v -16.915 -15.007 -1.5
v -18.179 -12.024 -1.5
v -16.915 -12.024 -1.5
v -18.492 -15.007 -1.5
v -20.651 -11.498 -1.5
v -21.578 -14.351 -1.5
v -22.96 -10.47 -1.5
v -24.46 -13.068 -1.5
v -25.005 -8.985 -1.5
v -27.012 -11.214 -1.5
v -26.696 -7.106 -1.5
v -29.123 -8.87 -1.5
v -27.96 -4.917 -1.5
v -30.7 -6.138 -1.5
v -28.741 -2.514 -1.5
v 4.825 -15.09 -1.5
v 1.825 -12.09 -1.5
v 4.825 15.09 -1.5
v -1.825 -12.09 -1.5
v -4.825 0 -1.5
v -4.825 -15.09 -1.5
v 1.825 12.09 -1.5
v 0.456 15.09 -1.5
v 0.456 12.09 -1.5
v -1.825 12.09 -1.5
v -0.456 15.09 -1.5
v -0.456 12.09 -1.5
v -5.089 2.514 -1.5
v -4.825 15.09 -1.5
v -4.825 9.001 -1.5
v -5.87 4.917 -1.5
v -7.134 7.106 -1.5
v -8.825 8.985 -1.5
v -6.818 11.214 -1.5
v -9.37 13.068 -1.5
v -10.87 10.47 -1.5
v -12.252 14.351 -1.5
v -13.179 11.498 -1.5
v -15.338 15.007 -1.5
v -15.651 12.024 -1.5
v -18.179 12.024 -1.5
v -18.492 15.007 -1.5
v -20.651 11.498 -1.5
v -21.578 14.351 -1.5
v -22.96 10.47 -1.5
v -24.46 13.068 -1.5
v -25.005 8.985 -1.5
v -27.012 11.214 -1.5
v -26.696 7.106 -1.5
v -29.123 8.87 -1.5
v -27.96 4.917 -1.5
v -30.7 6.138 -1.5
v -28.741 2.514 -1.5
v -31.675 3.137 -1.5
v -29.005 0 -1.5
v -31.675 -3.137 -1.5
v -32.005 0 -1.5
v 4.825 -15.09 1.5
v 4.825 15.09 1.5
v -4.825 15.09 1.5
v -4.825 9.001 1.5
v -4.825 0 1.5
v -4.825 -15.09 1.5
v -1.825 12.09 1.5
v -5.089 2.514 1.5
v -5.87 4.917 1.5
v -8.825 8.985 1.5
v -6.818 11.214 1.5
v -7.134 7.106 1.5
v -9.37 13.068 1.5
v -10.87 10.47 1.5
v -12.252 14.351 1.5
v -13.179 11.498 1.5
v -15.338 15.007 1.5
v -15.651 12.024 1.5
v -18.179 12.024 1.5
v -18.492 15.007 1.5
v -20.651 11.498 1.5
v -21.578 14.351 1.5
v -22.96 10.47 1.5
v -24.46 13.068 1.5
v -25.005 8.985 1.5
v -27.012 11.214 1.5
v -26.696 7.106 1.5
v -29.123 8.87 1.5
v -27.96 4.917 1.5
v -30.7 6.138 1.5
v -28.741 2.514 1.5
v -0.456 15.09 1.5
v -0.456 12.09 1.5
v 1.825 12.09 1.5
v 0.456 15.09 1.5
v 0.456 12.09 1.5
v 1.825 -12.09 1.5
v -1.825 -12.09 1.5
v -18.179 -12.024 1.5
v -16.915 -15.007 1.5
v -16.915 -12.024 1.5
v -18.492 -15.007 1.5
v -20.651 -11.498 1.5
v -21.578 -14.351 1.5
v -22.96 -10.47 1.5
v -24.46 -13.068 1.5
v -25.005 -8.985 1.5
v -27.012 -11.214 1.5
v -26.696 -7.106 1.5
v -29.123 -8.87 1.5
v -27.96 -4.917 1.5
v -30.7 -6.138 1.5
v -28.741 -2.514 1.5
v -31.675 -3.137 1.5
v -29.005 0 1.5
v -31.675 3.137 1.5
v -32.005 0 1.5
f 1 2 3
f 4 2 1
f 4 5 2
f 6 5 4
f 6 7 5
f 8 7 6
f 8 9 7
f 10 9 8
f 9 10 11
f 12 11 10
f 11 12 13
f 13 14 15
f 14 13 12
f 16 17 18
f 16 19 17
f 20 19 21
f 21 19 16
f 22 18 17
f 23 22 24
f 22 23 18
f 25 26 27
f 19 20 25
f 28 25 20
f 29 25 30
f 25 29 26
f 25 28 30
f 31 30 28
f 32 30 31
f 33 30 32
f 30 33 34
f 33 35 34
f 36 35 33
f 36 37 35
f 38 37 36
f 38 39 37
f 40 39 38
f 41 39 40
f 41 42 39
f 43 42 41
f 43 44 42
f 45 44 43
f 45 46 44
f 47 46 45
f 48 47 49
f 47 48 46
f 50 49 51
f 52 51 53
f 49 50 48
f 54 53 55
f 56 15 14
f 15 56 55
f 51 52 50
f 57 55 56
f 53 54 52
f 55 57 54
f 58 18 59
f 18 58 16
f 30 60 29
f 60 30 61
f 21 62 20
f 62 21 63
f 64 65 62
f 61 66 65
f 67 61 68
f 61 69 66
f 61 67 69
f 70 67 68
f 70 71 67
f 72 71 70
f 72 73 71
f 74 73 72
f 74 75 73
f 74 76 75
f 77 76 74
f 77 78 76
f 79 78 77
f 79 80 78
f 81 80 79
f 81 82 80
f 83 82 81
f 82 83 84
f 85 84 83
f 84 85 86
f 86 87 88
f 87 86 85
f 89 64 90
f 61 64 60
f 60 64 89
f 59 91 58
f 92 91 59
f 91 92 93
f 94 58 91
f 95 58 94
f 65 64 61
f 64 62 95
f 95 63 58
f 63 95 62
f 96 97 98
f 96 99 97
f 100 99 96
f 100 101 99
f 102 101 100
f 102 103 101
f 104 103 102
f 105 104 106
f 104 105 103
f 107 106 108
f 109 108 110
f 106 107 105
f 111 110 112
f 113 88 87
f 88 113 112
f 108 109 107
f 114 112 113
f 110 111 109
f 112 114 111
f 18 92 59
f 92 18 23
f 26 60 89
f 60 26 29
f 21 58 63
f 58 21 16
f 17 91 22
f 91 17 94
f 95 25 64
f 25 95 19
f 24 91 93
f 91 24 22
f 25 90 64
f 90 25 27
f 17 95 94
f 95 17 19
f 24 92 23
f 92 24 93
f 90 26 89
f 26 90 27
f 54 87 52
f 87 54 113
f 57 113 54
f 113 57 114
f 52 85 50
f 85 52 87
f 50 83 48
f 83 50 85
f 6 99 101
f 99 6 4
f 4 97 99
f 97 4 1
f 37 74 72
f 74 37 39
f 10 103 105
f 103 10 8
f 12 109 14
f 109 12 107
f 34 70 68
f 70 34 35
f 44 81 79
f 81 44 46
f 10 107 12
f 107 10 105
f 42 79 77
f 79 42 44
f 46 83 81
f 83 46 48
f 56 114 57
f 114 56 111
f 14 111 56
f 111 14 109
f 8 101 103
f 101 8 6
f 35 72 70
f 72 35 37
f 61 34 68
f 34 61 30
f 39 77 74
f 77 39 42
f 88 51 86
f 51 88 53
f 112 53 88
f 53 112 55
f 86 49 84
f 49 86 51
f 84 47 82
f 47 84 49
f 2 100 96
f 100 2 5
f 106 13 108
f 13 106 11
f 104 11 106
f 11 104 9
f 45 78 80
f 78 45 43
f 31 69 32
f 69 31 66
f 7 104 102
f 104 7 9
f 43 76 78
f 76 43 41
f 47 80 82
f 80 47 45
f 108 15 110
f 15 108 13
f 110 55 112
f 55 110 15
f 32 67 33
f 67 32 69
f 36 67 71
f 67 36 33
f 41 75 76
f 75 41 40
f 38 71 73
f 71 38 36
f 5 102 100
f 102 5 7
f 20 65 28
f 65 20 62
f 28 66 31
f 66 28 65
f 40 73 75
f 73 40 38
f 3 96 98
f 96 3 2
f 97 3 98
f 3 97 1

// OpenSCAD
use <MCAD/regular_shapes.scad>


g = 3.65;
t = 3;
d = 24.18 + 2*t;

r = d/2;

rotate([0, 90, 0]){ // for printing

difference(){
    cube([t, d, 2 * t + g], center=true);
    translate([0, 0, 0])
    cube([t, d - 2*t, g], center=true);
    translate([0, t, 0])
    cube([t, d - 2*t, g/4], center=true);
}


translate([0, 0, -r - g/2])
rotate([0, 90, 0])
difference(){
    cylinder_tube(t, r, t, center=true);
    translate([0, 0, -t/2])
    rotate([0, 0, 180])
    cube([r, r, t]);
}

} // for printing
